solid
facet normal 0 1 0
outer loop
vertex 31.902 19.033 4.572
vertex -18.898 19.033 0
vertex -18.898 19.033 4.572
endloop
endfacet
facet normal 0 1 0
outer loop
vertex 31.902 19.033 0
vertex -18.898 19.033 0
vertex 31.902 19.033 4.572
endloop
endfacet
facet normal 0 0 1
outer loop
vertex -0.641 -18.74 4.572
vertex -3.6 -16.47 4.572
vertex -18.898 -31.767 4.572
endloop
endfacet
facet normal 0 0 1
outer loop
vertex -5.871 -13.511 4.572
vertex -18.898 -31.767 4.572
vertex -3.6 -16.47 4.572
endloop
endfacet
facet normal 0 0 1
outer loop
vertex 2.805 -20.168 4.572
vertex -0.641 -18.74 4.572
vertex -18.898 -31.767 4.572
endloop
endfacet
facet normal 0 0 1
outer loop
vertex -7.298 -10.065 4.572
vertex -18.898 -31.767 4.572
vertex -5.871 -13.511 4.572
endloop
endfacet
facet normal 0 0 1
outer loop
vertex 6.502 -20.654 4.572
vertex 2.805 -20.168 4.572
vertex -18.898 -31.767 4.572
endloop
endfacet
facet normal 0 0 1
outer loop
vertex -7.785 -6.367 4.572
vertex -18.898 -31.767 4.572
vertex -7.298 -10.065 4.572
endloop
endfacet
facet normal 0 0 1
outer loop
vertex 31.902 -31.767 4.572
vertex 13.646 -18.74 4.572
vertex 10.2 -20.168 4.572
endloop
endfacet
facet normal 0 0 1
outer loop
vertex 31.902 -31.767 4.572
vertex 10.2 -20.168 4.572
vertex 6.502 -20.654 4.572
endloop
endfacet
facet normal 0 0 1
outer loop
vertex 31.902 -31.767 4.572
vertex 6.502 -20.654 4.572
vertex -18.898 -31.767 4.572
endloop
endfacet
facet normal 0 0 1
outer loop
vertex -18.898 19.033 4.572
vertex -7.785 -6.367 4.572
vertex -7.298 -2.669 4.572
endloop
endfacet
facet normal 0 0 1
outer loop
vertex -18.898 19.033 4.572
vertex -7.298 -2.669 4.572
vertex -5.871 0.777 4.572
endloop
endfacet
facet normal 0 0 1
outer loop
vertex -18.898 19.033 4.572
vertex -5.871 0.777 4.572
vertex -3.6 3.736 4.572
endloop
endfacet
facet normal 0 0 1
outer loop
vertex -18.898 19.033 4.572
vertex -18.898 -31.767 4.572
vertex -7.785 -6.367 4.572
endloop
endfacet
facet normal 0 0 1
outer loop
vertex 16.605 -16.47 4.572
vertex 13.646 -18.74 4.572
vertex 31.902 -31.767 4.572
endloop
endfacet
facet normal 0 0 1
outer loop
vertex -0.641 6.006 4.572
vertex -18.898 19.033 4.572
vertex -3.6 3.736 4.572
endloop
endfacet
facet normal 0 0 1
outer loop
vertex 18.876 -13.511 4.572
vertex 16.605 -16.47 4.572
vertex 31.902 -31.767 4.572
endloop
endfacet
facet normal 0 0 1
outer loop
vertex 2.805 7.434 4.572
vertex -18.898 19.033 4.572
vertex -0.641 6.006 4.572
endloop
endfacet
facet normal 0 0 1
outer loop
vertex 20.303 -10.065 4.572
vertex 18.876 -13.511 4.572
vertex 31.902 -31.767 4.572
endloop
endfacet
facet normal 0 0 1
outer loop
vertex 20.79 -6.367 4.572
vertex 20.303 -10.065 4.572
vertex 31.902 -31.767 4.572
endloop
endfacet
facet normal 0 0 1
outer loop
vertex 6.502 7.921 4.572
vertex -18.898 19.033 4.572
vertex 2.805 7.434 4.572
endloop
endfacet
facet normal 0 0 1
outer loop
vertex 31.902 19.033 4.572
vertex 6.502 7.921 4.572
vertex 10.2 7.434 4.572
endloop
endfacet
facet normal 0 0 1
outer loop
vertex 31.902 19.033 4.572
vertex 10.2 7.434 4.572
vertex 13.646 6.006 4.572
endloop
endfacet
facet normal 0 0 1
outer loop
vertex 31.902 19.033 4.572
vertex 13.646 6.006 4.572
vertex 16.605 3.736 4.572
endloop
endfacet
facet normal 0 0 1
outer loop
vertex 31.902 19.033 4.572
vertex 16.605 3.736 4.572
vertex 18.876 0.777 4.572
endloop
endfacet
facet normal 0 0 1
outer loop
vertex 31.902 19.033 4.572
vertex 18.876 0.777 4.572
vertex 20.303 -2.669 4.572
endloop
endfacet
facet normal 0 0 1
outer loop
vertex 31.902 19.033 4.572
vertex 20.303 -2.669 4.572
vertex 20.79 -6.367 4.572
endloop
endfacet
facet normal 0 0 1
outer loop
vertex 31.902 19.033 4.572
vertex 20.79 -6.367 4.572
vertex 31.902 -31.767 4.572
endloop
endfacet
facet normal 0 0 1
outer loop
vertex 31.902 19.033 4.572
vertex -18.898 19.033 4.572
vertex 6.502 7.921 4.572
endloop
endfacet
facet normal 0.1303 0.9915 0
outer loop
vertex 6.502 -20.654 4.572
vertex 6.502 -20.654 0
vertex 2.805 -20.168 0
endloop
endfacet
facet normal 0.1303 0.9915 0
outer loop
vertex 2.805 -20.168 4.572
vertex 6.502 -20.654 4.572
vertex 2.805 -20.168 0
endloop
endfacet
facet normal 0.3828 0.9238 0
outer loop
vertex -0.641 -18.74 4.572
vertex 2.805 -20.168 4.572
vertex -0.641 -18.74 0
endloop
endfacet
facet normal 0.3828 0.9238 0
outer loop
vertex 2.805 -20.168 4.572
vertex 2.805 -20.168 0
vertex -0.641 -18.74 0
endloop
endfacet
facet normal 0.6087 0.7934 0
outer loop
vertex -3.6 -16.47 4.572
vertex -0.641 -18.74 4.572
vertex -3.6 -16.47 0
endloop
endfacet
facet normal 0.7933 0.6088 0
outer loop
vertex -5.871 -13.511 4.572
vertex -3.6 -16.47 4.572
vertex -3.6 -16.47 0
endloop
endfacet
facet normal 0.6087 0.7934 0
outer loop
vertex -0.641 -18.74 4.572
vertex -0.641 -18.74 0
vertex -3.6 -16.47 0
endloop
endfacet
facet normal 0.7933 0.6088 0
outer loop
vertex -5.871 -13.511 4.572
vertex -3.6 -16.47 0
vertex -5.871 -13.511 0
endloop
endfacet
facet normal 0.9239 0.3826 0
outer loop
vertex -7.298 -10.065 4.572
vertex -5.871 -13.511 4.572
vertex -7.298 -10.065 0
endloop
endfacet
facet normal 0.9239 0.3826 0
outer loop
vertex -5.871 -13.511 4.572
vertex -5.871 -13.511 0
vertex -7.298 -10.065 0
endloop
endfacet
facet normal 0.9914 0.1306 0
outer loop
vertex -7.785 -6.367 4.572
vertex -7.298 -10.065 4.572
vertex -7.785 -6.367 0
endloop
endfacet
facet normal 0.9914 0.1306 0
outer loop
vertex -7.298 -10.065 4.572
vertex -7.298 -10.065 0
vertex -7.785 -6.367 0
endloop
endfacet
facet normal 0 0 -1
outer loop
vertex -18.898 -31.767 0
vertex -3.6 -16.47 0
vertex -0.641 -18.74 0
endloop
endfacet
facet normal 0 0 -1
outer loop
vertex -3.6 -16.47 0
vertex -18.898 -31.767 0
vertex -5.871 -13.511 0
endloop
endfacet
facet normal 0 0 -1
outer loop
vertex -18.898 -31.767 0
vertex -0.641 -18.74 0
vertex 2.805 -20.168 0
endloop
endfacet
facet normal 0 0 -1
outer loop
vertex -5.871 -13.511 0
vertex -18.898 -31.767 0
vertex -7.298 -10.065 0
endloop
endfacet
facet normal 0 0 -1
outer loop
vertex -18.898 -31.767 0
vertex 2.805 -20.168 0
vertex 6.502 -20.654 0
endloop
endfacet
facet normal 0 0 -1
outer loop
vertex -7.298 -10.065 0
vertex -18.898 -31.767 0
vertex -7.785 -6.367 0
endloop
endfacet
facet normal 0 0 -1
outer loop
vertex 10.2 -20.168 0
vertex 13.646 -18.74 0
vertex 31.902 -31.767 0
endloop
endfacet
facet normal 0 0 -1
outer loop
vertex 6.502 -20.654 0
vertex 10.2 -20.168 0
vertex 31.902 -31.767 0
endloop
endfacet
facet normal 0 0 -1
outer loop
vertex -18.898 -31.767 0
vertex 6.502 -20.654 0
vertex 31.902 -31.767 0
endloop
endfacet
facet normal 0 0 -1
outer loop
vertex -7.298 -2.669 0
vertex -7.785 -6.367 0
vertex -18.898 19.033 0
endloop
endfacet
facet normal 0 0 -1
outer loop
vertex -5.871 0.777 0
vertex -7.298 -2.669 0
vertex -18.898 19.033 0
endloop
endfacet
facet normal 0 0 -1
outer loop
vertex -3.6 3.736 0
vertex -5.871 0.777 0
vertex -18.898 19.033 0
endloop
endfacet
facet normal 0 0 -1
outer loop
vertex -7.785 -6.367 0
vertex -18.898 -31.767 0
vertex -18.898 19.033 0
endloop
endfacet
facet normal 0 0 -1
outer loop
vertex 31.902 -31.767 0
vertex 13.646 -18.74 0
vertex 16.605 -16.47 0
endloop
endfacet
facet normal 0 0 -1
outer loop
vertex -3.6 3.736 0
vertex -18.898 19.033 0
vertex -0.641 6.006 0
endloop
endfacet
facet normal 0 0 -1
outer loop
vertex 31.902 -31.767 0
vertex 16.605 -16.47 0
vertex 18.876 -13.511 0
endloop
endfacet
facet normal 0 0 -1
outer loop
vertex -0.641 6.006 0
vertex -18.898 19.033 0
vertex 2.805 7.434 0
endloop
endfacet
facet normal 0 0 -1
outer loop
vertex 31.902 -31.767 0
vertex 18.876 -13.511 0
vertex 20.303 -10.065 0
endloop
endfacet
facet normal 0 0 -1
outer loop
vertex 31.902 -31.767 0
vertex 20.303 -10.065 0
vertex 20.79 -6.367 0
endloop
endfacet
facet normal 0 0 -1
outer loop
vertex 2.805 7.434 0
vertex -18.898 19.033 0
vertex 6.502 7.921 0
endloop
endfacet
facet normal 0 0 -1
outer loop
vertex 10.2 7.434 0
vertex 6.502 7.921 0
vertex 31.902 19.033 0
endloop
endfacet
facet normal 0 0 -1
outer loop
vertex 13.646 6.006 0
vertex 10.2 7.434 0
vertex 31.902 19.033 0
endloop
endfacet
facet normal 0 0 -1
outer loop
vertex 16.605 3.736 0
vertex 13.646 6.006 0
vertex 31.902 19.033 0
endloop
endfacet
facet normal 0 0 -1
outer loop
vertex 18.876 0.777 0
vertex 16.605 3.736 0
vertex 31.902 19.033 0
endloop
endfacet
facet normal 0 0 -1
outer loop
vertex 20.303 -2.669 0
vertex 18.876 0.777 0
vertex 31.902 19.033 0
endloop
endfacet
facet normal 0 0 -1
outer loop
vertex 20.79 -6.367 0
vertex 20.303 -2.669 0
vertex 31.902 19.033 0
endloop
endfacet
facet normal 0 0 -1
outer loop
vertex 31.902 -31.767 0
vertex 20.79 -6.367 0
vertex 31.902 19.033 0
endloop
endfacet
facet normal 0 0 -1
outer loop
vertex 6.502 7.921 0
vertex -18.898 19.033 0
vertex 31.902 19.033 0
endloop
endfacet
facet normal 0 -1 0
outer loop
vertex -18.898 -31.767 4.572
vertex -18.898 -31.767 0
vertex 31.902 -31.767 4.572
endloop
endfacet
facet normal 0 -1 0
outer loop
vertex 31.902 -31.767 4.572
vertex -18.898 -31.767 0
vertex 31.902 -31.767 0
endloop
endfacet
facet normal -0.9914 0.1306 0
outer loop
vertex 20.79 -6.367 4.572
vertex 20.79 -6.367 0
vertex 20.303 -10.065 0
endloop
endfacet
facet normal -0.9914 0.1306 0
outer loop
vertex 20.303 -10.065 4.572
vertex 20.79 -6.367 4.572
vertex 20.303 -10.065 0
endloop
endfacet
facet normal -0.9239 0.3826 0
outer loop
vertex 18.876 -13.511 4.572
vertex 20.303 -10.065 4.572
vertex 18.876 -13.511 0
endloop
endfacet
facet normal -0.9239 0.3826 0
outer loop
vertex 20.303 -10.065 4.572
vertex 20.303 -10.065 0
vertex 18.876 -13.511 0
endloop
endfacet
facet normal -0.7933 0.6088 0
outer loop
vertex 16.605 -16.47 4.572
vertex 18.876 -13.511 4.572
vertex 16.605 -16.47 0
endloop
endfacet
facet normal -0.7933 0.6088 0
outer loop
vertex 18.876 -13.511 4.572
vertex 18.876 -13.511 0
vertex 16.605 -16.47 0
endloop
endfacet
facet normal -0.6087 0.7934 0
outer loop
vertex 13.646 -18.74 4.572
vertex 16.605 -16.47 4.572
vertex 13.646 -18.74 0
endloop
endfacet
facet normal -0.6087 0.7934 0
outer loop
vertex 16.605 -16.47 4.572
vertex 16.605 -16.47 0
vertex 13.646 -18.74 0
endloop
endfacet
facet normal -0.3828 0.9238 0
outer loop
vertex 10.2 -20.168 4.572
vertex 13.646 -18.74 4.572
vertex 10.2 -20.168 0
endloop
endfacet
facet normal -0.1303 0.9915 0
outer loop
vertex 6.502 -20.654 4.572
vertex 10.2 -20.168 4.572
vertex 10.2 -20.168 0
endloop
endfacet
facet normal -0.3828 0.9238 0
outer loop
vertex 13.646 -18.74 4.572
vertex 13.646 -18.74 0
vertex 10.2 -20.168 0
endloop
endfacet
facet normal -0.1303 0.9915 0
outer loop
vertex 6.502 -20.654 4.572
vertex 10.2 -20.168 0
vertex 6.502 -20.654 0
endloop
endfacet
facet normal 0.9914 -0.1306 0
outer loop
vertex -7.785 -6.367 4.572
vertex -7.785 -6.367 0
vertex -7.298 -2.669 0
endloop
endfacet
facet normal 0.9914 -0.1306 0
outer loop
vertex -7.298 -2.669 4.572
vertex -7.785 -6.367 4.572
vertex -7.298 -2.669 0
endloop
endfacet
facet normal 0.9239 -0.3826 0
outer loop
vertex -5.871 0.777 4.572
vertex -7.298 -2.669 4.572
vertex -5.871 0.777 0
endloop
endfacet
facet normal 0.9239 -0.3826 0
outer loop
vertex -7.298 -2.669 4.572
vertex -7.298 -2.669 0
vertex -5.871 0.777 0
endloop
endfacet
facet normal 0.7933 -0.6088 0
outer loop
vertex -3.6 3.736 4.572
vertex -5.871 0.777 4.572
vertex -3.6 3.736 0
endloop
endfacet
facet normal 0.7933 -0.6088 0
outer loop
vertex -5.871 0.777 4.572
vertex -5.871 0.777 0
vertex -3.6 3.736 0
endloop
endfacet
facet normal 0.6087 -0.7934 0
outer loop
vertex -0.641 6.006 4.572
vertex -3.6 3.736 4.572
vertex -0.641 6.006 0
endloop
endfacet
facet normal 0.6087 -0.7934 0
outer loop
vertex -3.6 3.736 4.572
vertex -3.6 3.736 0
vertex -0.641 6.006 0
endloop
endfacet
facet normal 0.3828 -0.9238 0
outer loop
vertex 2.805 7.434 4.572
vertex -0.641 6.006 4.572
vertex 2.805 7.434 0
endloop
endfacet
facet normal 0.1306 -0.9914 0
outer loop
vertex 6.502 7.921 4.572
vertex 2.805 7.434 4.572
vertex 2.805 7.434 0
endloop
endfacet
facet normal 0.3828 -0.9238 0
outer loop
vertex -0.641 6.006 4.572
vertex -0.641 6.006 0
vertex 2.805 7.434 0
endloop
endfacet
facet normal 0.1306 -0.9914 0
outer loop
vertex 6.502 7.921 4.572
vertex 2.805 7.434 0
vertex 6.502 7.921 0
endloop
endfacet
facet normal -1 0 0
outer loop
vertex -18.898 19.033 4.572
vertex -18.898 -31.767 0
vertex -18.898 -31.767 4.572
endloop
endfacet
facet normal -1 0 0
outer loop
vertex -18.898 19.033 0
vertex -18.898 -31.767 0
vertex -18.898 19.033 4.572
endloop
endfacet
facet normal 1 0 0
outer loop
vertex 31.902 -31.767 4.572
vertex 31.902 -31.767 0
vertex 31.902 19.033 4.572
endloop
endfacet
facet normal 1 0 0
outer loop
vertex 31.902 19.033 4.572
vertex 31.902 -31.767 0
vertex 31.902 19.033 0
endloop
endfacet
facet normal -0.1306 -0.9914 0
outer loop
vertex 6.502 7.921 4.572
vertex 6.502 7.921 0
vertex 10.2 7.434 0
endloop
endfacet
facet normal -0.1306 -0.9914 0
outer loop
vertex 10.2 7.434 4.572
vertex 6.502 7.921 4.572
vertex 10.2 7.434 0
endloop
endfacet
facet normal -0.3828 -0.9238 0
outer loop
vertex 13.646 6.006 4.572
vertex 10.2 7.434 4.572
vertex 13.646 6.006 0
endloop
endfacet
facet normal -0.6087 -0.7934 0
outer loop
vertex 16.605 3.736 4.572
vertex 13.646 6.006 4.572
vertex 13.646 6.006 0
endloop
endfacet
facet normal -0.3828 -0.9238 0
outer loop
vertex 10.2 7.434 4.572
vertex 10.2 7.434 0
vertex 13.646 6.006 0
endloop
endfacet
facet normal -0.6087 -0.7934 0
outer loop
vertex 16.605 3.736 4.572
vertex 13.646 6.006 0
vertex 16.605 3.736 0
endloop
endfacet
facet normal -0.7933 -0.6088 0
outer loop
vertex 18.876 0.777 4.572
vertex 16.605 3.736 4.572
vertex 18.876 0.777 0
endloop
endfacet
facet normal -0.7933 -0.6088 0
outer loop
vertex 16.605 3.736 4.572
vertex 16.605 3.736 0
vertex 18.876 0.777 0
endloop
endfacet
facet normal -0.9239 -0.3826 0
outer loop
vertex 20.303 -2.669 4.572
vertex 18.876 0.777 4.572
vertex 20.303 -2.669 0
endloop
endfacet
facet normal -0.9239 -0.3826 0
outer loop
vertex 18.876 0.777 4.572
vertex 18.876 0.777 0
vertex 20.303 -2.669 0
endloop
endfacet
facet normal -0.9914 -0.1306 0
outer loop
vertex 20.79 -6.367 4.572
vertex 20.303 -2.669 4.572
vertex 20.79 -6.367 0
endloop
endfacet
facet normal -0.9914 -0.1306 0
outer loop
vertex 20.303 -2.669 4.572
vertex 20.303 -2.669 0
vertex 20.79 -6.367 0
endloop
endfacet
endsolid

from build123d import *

# Parameters (mm, degrees)
SKETCH1_W           = 50.8
SKETCH1_H           = 50.8
BOSS_EXTRUDE1_DEPTH = 4.572
CUT_EXTRUDE1_DEPTH  = 4.572


with BuildPart() as part:
    # Sketch1 → Boss-Extrude1 (new body)
    with BuildSketch(Plane.XY):
        with Locations((6.5024, -6.366933333)):
            Rectangle(SKETCH1_W, SKETCH1_H)
    extrude(amount=BOSS_EXTRUDE1_DEPTH)

    # Sketch2 → Cut-Extrude1 (cut)
    with BuildSketch(Plane(origin=(0, 0, 0), x_dir=(-1, 0, 0), z_dir=(0, 0, -1))):
        with BuildLine():
            ThreePointArc((7.7851, -6.366933333), (3.600388136, 3.735854803), (-6.5024, 7.920566667))
            Line((-6.5024, 7.920566667), (-6.5024, -6.366933333))
            Line((-6.5024, -6.366933333), (7.7851, -6.366933333))
        make_face()
        with BuildLine():
            Line((-6.5024, -6.366933333), (-6.5024, 7.920566667))
            ThreePointArc((-6.5024, 7.920566667), (-16.605188136, 3.735854803), (-20.7899, -6.366933333))
            Line((-20.7899, -6.366933333), (-6.5024, -6.366933333))
        make_face()
        with BuildLine():
            Line((7.7851, -6.366933333), (-6.5024, -6.366933333))
            Line((-6.5024, -6.366933333), (-6.5024, -20.654433333))
            ThreePointArc((-6.5024, -20.654433333), (3.600388136, -16.46972147), (7.7851, -6.366933333))
        make_face()
        with BuildLine():
            Line((-6.5024, -20.654433333), (-6.5024, -6.366933333))
            Line((-6.5024, -6.366933333), (-20.7899, -6.366933333))
            ThreePointArc((-20.7899, -6.366933333), (-16.605188136, -16.46972147), (-6.5024, -20.654433333))
        make_face()
    extrude(amount=-CUT_EXTRUDE1_DEPTH, mode=Mode.SUBTRACT)


solid = part.part
